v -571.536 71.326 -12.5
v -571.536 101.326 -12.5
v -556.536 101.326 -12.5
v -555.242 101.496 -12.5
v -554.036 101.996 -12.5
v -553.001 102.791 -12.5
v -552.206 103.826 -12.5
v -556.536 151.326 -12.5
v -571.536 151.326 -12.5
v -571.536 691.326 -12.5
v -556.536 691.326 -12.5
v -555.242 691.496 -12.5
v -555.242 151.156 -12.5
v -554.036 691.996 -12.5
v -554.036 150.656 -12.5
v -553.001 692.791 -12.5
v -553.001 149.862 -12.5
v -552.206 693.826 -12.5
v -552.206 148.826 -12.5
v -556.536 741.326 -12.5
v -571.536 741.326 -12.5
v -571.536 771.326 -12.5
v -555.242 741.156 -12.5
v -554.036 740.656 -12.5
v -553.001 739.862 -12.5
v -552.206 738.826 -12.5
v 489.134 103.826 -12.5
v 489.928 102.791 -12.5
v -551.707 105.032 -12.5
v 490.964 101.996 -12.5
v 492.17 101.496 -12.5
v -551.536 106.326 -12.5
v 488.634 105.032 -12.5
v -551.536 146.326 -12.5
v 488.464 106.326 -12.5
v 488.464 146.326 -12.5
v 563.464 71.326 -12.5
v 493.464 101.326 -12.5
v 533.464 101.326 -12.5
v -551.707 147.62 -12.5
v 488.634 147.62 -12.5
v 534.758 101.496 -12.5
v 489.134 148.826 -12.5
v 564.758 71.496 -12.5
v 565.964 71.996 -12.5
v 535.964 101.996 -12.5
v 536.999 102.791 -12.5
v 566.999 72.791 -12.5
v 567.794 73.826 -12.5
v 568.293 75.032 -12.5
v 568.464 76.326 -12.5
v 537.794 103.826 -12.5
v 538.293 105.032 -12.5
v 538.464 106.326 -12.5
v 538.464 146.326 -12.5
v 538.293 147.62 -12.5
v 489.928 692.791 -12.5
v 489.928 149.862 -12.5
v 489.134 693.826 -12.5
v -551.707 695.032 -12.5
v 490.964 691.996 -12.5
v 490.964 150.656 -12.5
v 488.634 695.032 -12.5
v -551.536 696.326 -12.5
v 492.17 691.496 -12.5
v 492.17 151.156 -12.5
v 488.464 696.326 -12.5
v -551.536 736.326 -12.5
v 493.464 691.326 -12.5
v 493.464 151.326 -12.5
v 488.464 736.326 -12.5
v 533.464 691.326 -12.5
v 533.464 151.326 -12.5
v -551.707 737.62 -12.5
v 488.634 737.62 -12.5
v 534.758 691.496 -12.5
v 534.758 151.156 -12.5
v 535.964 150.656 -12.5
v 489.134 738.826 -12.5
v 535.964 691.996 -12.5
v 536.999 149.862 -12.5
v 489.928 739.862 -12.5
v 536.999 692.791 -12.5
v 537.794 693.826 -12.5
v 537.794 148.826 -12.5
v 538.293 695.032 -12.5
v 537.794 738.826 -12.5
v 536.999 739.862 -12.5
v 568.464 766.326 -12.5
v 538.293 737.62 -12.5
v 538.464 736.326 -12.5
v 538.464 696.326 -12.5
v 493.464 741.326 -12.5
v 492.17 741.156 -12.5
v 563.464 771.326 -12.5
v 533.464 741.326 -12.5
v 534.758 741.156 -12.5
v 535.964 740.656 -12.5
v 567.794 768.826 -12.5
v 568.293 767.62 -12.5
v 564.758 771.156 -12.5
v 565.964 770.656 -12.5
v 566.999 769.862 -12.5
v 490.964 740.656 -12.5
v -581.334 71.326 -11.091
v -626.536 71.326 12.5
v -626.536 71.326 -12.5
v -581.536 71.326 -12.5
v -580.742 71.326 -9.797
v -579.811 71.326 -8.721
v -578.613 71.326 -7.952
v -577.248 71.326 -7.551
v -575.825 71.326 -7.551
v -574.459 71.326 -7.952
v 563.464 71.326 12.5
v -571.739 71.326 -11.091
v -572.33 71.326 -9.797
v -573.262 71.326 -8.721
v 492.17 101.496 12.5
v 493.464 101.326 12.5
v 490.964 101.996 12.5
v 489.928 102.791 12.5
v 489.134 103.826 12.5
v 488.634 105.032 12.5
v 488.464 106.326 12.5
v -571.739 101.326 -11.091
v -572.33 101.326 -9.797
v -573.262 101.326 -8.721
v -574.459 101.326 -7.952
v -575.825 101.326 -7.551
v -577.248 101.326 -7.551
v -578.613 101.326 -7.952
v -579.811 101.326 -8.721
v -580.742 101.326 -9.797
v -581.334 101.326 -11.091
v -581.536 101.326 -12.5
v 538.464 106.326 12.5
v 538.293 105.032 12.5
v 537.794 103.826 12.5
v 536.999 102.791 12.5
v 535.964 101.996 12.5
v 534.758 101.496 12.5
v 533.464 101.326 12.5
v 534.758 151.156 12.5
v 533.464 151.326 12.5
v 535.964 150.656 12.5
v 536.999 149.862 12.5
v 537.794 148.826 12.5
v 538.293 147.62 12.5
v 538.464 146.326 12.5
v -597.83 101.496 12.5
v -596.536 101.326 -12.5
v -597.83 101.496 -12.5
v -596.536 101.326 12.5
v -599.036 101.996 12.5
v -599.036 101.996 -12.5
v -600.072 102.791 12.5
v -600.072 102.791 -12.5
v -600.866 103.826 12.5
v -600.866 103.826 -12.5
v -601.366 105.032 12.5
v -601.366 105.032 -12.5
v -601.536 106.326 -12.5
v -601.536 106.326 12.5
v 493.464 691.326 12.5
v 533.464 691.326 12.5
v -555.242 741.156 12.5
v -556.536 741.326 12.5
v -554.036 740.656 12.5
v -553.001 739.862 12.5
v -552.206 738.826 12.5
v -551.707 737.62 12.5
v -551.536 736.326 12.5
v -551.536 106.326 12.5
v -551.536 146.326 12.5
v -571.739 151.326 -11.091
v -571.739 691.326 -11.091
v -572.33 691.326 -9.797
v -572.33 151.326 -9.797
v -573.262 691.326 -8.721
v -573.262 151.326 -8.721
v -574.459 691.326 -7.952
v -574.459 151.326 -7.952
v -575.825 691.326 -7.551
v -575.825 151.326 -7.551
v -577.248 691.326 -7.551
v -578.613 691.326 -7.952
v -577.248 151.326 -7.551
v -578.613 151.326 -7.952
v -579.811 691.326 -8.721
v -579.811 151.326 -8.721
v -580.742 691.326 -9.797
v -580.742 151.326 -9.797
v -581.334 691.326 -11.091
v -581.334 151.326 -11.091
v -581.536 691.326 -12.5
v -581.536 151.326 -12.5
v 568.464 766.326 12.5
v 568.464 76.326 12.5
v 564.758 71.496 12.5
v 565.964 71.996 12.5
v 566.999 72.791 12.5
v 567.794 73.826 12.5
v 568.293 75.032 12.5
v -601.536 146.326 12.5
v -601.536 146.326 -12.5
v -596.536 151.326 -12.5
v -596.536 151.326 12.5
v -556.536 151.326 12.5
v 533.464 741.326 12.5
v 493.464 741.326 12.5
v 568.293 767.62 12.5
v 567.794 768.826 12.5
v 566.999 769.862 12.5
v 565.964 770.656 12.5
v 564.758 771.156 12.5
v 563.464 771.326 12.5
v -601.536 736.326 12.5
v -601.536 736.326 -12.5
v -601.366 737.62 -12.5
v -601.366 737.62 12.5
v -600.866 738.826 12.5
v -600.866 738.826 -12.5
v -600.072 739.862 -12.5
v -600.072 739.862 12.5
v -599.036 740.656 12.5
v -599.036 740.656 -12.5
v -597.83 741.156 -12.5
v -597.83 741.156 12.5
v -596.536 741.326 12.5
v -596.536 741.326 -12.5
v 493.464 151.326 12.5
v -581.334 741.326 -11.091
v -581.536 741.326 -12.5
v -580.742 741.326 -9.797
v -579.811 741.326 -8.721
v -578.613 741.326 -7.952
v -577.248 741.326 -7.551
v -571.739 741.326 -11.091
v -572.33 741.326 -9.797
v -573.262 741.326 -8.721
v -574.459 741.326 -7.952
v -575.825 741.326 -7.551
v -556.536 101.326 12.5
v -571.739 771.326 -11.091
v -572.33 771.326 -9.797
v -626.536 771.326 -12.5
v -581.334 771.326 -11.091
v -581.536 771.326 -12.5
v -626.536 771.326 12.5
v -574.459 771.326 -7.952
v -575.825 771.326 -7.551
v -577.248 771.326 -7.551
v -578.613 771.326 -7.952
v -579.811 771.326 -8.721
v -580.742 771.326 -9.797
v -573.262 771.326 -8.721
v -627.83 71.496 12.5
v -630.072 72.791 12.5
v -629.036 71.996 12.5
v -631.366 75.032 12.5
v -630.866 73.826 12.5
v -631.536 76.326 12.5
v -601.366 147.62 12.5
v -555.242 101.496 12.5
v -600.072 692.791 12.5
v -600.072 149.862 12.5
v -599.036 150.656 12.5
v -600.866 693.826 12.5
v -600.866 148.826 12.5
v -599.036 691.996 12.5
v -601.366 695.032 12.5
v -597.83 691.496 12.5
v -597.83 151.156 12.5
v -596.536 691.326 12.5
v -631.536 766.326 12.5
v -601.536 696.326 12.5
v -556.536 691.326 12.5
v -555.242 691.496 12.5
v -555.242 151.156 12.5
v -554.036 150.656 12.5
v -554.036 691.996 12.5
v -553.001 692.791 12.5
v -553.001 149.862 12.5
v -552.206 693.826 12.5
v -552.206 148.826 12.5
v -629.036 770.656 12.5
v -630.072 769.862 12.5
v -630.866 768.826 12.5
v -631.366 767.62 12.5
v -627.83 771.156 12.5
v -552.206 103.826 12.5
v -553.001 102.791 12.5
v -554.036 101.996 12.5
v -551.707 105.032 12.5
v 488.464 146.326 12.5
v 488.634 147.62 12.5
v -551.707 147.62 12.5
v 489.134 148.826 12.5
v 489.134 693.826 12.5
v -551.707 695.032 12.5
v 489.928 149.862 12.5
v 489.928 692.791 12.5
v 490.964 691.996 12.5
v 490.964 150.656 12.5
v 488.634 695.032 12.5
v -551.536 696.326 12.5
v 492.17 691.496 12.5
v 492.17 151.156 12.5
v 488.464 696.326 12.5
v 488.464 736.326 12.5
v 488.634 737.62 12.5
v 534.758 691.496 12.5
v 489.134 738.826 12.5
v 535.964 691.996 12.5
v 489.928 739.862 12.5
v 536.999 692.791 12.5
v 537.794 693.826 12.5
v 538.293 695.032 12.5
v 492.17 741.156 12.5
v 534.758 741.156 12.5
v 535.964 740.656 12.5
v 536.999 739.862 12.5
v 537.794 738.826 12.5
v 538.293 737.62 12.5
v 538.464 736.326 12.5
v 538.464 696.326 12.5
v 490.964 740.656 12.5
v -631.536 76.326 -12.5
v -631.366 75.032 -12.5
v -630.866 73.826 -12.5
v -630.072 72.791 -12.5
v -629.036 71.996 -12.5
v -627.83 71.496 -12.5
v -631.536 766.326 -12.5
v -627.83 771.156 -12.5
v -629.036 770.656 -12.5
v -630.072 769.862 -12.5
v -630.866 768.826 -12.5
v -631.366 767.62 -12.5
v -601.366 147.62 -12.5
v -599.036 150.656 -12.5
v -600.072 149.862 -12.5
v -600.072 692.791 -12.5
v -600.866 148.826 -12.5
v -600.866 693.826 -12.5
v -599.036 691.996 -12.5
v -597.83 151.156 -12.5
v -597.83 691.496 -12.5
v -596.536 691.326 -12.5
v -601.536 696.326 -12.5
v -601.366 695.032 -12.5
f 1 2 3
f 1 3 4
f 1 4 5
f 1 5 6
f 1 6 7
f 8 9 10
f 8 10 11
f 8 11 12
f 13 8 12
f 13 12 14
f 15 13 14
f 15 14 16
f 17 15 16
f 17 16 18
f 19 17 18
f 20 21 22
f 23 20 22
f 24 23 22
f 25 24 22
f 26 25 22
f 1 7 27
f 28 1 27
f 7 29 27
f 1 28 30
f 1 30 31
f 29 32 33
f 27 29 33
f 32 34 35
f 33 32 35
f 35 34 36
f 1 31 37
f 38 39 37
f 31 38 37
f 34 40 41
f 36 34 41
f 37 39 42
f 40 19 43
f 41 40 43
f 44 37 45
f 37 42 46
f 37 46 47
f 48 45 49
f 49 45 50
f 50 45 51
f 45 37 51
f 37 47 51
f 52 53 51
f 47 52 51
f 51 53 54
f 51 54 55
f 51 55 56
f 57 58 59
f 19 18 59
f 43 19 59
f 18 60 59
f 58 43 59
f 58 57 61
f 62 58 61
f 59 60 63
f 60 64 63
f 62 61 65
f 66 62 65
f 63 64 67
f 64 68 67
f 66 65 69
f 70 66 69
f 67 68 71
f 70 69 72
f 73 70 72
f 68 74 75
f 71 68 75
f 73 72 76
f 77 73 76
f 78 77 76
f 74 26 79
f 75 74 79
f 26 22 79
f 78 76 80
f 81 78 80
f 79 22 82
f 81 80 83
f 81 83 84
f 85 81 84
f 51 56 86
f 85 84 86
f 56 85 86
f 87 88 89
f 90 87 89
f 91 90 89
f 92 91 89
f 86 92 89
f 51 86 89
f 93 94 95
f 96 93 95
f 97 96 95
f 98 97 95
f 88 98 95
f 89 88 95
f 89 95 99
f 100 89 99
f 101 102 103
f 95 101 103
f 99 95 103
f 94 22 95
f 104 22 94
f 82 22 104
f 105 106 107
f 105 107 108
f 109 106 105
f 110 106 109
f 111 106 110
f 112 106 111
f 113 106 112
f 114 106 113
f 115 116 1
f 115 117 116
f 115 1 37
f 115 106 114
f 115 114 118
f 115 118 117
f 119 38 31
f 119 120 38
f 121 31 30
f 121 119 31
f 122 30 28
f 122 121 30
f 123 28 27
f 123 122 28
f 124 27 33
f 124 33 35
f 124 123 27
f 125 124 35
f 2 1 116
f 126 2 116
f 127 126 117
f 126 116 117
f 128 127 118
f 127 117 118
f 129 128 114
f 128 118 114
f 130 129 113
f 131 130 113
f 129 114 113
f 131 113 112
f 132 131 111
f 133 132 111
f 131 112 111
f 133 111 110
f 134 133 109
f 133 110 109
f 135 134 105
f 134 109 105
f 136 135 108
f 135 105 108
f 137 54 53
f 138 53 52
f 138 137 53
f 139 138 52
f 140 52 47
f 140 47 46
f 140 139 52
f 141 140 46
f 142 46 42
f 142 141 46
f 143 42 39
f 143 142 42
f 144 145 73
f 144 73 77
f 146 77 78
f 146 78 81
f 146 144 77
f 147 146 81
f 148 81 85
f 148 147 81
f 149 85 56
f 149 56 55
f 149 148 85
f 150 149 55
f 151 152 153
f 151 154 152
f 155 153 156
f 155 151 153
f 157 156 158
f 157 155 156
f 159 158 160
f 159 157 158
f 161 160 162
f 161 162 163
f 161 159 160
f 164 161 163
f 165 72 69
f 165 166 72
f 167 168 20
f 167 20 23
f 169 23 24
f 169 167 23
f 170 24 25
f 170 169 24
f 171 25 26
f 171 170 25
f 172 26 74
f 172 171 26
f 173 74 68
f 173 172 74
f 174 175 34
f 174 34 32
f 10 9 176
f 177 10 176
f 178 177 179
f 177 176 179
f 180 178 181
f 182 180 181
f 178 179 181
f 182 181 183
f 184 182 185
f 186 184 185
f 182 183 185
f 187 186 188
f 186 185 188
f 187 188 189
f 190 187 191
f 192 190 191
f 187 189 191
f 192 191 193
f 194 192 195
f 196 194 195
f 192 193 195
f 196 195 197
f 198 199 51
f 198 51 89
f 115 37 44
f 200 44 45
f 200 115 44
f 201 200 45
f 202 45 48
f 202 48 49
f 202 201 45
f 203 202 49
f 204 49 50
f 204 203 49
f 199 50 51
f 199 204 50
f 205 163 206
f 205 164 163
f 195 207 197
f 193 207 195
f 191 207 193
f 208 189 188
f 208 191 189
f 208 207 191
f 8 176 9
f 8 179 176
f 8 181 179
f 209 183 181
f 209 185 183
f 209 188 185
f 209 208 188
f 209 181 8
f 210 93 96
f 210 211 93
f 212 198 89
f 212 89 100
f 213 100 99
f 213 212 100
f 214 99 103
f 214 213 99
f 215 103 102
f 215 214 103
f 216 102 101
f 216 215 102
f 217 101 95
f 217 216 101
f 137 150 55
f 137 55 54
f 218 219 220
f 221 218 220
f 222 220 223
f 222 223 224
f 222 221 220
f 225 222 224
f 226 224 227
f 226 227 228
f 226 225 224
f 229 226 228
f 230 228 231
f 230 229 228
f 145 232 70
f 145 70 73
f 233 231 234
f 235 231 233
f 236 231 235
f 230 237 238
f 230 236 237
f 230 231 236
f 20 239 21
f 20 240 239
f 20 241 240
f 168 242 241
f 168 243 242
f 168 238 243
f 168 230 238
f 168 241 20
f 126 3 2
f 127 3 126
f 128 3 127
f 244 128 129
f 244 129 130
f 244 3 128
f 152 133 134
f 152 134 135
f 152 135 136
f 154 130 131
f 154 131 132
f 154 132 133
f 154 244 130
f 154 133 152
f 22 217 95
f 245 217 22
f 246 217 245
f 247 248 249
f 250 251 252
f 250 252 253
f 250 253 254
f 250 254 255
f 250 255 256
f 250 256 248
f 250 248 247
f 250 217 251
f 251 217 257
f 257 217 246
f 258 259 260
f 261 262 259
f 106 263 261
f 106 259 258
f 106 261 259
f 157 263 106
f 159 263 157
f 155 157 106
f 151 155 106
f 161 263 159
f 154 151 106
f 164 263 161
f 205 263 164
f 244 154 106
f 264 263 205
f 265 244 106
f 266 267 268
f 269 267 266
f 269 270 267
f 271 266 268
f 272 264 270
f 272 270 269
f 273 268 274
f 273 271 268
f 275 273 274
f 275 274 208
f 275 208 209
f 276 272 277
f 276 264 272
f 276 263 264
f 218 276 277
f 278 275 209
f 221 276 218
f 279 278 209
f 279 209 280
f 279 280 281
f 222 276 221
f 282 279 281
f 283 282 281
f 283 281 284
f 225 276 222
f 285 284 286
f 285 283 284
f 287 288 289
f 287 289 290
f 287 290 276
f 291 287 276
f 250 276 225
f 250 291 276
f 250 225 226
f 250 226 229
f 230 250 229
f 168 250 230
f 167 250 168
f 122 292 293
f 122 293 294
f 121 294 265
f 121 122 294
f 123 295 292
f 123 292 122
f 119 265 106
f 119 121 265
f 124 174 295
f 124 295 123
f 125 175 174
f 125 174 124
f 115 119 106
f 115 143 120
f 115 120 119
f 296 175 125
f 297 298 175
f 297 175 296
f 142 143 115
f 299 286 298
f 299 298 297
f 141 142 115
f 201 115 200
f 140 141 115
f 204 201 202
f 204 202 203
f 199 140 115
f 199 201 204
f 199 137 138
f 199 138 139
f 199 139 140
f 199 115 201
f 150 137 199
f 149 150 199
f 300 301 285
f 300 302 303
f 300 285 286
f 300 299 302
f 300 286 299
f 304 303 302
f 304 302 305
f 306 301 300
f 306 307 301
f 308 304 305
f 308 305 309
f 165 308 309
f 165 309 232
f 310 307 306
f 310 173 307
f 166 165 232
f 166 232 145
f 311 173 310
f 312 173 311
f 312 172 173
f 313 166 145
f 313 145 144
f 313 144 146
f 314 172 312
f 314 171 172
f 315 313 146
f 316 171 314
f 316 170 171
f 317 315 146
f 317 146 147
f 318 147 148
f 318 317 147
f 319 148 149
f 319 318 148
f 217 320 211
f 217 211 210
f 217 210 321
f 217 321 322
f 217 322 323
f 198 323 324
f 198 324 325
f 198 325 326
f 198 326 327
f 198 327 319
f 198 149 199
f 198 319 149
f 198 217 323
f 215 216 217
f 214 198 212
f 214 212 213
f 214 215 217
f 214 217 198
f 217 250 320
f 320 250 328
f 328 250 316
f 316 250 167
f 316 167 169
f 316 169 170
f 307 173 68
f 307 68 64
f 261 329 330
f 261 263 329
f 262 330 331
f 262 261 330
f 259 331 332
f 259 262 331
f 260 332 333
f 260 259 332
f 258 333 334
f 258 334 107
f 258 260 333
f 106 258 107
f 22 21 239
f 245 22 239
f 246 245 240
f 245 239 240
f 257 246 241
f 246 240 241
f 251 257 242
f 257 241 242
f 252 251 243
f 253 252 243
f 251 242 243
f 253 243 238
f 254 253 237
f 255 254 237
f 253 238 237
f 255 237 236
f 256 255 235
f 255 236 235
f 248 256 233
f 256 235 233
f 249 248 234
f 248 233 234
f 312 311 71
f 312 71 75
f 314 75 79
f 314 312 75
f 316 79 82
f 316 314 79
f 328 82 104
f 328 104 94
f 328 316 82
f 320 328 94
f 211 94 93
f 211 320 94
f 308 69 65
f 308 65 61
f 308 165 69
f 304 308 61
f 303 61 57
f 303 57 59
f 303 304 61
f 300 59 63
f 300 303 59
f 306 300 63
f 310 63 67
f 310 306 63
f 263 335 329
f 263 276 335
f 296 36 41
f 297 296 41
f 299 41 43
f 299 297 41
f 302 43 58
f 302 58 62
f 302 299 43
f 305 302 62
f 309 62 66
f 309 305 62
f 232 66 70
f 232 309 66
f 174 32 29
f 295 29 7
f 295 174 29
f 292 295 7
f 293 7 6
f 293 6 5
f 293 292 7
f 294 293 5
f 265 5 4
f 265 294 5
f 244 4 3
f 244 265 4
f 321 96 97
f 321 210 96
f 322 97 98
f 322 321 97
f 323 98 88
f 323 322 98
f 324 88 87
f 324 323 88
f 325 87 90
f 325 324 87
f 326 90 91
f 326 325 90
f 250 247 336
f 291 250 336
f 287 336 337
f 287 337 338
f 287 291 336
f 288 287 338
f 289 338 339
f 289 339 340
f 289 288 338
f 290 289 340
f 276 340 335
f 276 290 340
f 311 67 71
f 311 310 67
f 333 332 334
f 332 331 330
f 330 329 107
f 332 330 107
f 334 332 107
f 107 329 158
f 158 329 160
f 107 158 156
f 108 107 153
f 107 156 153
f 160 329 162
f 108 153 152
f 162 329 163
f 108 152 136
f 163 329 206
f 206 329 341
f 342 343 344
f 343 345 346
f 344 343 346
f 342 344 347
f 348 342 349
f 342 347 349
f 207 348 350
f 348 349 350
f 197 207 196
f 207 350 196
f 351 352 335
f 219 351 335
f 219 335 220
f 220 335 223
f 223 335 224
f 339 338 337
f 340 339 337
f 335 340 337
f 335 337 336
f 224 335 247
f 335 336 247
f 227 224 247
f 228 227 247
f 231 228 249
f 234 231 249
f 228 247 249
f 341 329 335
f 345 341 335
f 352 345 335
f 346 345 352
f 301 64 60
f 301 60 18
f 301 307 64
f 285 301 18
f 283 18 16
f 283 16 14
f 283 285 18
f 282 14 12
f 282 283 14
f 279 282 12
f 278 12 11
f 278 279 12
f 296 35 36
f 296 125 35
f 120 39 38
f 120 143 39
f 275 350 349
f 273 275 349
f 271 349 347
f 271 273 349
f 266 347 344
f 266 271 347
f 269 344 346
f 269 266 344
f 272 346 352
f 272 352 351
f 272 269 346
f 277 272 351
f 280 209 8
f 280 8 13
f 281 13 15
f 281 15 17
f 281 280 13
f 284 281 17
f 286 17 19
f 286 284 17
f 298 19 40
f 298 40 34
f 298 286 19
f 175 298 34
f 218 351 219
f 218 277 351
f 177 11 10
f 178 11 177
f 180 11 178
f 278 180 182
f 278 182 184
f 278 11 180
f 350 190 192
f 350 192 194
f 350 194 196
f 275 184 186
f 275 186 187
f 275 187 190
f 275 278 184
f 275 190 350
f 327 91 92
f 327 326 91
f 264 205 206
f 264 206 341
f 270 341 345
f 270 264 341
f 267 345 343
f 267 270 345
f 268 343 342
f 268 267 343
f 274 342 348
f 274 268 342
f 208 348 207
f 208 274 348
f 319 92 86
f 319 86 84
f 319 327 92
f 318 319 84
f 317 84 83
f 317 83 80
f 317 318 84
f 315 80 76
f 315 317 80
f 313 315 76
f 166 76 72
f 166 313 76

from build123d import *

# Parameters (mm, degrees)
F1_DEPTH = 12.5
F2_W     = 5
F2_H     = 30
F2_H_2   = 540


with BuildPart() as f1:
    # F0 (on Top) → F1 (new body, symmetric)
    with BuildSketch(Plane.XY):
        with BuildLine():
            ThreePointArc((-631.5362024307, 76.3261139393), (-630.0717363367, 72.7905800334), (-626.5362024307, 71.3261139393))
            Line((-626.5362024307, 71.3261139393), (563.4637975693, 71.3261139393))
            ThreePointArc((563.4637975693, 71.3261139393), (566.9993314752, 72.7905800334), (568.4637975693, 76.3261139393))
            Line((568.4637975693, 76.3261139393), (568.4637975693, 766.3261139393))
            ThreePointArc((568.4637975693, 766.3261139393), (566.9993314752, 769.8616478452), (563.4637975693, 771.3261139393))
            Line((563.4637975693, 771.3261139393), (-626.5362024307, 771.3261139393))
            ThreePointArc((-626.5362024307, 771.3261139393), (-630.0717363367, 769.8616478452), (-631.5362024307, 766.3261139393))
            Line((-631.5362024307, 766.3261139393), (-631.5362024307, 76.3261139393))
        make_face()
        with BuildLine():
            ThreePointArc((-601.5362024307, 146.3261139393), (-600.0717363367, 149.8616478452), (-596.5362024307, 151.3261139393))
            Line((-596.5362024307, 151.3261139393), (-556.5362024307, 151.3261139393))
            ThreePointArc((-556.5362024307, 151.3261139393), (-553.0006685248, 149.8616478452), (-551.5362024307, 146.3261139393))
            Line((-551.5362024307, 146.3261139393), (-551.5362024307, 106.3261139393))
            ThreePointArc((-551.5362024307, 106.3261139393), (-553.0006685248, 102.7905800334), (-556.5362024307, 101.3261139393))
            Line((-556.5362024307, 101.3261139393), (-596.5362024307, 101.3261139393))
            ThreePointArc((-596.5362024307, 101.3261139393), (-600.0717363367, 102.7905800334), (-601.5362024307, 106.3261139393))
            Line((-601.5362024307, 106.3261139393), (-601.5362024307, 146.3261139393))
        make_face(mode=Mode.SUBTRACT)
        with BuildLine():
            ThreePointArc((488.4637975693, 146.3261139393), (489.9282636633, 149.8616478452), (493.4637975693, 151.3261139393))
            Line((493.4637975693, 151.3261139393), (533.4637975693, 151.3261139393))
            ThreePointArc((533.4637975693, 151.3261139393), (536.9993314752, 149.8616478452), (538.4637975693, 146.3261139393))
            Line((538.4637975693, 146.3261139393), (538.4637975693, 106.3261139393))
            ThreePointArc((538.4637975693, 106.3261139393), (536.9993314752, 102.7905800334), (533.4637975693, 101.3261139393))
            Line((533.4637975693, 101.3261139393), (493.4637975693, 101.3261139393))
            ThreePointArc((493.4637975693, 101.3261139393), (489.9282636633, 102.7905800334), (488.4637975693, 106.3261139393))
            Line((488.4637975693, 106.3261139393), (488.4637975693, 146.3261139393))
        make_face(mode=Mode.SUBTRACT)
        with BuildLine():
            ThreePointArc((-601.5362024307, 736.3261139393), (-600.0717363367, 739.8616478452), (-596.5362024307, 741.3261139393))
            Line((-596.5362024307, 741.3261139393), (-556.5362024307, 741.3261139393))
            ThreePointArc((-556.5362024307, 741.3261139393), (-553.0006685248, 739.8616478452), (-551.5362024307, 736.3261139393))
            Line((-551.5362024307, 736.3261139393), (-551.5362024307, 696.3261139393))
            ThreePointArc((-551.5362024307, 696.3261139393), (-553.0006685248, 692.7905800334), (-556.5362024307, 691.3261139393))
            Line((-556.5362024307, 691.3261139393), (-596.5362024307, 691.3261139393))
            ThreePointArc((-596.5362024307, 691.3261139393), (-600.0717363367, 692.7905800334), (-601.5362024307, 696.3261139393))
            Line((-601.5362024307, 696.3261139393), (-601.5362024307, 736.3261139393))
        make_face(mode=Mode.SUBTRACT)
        with BuildLine():
            ThreePointArc((488.4637975693, 736.3261139393), (489.9282636633, 739.8616478452), (493.4637975693, 741.3261139393))
            Line((493.4637975693, 741.3261139393), (533.4637975693, 741.3261139393))
            ThreePointArc((533.4637975693, 741.3261139393), (536.9993314752, 739.8616478452), (538.4637975693, 736.3261139393))
            Line((538.4637975693, 736.3261139393), (538.4637975693, 696.3261139393))
            ThreePointArc((538.4637975693, 696.3261139393), (536.9993314752, 692.7905800334), (533.4637975693, 691.3261139393))
            Line((533.4637975693, 691.3261139393), (493.4637975693, 691.3261139393))
            ThreePointArc((493.4637975693, 691.3261139393), (489.9282636633, 692.7905800334), (488.4637975693, 696.3261139393))
            Line((488.4637975693, 696.3261139393), (488.4637975693, 736.3261139393))
        make_face(mode=Mode.SUBTRACT)
    extrude(amount=F1_DEPTH, both=True)

    # F2 (on face) → F3 (revolve, cut)
    with BuildSketch(Plane(origin=(0, 0, -12.5), x_dir=(1, 0, 0), z_dir=(0, 0, -1))):
        with Locations((-574.0362024307, -86.3261139393)):
            Rectangle(F2_W, F2_H)
        with Locations((-574.0362024307, -421.3261139393)):
            Rectangle(F2_W, F2_H_2)
        with Locations((-574.0362024307, -756.3261139393)):
            Rectangle(F2_W, F2_H)
    revolve(axis=Axis((-576.5362024307, 421.3261139393, -12.5), (0, -1, 0)), mode=Mode.SUBTRACT)


solid = f1.part
